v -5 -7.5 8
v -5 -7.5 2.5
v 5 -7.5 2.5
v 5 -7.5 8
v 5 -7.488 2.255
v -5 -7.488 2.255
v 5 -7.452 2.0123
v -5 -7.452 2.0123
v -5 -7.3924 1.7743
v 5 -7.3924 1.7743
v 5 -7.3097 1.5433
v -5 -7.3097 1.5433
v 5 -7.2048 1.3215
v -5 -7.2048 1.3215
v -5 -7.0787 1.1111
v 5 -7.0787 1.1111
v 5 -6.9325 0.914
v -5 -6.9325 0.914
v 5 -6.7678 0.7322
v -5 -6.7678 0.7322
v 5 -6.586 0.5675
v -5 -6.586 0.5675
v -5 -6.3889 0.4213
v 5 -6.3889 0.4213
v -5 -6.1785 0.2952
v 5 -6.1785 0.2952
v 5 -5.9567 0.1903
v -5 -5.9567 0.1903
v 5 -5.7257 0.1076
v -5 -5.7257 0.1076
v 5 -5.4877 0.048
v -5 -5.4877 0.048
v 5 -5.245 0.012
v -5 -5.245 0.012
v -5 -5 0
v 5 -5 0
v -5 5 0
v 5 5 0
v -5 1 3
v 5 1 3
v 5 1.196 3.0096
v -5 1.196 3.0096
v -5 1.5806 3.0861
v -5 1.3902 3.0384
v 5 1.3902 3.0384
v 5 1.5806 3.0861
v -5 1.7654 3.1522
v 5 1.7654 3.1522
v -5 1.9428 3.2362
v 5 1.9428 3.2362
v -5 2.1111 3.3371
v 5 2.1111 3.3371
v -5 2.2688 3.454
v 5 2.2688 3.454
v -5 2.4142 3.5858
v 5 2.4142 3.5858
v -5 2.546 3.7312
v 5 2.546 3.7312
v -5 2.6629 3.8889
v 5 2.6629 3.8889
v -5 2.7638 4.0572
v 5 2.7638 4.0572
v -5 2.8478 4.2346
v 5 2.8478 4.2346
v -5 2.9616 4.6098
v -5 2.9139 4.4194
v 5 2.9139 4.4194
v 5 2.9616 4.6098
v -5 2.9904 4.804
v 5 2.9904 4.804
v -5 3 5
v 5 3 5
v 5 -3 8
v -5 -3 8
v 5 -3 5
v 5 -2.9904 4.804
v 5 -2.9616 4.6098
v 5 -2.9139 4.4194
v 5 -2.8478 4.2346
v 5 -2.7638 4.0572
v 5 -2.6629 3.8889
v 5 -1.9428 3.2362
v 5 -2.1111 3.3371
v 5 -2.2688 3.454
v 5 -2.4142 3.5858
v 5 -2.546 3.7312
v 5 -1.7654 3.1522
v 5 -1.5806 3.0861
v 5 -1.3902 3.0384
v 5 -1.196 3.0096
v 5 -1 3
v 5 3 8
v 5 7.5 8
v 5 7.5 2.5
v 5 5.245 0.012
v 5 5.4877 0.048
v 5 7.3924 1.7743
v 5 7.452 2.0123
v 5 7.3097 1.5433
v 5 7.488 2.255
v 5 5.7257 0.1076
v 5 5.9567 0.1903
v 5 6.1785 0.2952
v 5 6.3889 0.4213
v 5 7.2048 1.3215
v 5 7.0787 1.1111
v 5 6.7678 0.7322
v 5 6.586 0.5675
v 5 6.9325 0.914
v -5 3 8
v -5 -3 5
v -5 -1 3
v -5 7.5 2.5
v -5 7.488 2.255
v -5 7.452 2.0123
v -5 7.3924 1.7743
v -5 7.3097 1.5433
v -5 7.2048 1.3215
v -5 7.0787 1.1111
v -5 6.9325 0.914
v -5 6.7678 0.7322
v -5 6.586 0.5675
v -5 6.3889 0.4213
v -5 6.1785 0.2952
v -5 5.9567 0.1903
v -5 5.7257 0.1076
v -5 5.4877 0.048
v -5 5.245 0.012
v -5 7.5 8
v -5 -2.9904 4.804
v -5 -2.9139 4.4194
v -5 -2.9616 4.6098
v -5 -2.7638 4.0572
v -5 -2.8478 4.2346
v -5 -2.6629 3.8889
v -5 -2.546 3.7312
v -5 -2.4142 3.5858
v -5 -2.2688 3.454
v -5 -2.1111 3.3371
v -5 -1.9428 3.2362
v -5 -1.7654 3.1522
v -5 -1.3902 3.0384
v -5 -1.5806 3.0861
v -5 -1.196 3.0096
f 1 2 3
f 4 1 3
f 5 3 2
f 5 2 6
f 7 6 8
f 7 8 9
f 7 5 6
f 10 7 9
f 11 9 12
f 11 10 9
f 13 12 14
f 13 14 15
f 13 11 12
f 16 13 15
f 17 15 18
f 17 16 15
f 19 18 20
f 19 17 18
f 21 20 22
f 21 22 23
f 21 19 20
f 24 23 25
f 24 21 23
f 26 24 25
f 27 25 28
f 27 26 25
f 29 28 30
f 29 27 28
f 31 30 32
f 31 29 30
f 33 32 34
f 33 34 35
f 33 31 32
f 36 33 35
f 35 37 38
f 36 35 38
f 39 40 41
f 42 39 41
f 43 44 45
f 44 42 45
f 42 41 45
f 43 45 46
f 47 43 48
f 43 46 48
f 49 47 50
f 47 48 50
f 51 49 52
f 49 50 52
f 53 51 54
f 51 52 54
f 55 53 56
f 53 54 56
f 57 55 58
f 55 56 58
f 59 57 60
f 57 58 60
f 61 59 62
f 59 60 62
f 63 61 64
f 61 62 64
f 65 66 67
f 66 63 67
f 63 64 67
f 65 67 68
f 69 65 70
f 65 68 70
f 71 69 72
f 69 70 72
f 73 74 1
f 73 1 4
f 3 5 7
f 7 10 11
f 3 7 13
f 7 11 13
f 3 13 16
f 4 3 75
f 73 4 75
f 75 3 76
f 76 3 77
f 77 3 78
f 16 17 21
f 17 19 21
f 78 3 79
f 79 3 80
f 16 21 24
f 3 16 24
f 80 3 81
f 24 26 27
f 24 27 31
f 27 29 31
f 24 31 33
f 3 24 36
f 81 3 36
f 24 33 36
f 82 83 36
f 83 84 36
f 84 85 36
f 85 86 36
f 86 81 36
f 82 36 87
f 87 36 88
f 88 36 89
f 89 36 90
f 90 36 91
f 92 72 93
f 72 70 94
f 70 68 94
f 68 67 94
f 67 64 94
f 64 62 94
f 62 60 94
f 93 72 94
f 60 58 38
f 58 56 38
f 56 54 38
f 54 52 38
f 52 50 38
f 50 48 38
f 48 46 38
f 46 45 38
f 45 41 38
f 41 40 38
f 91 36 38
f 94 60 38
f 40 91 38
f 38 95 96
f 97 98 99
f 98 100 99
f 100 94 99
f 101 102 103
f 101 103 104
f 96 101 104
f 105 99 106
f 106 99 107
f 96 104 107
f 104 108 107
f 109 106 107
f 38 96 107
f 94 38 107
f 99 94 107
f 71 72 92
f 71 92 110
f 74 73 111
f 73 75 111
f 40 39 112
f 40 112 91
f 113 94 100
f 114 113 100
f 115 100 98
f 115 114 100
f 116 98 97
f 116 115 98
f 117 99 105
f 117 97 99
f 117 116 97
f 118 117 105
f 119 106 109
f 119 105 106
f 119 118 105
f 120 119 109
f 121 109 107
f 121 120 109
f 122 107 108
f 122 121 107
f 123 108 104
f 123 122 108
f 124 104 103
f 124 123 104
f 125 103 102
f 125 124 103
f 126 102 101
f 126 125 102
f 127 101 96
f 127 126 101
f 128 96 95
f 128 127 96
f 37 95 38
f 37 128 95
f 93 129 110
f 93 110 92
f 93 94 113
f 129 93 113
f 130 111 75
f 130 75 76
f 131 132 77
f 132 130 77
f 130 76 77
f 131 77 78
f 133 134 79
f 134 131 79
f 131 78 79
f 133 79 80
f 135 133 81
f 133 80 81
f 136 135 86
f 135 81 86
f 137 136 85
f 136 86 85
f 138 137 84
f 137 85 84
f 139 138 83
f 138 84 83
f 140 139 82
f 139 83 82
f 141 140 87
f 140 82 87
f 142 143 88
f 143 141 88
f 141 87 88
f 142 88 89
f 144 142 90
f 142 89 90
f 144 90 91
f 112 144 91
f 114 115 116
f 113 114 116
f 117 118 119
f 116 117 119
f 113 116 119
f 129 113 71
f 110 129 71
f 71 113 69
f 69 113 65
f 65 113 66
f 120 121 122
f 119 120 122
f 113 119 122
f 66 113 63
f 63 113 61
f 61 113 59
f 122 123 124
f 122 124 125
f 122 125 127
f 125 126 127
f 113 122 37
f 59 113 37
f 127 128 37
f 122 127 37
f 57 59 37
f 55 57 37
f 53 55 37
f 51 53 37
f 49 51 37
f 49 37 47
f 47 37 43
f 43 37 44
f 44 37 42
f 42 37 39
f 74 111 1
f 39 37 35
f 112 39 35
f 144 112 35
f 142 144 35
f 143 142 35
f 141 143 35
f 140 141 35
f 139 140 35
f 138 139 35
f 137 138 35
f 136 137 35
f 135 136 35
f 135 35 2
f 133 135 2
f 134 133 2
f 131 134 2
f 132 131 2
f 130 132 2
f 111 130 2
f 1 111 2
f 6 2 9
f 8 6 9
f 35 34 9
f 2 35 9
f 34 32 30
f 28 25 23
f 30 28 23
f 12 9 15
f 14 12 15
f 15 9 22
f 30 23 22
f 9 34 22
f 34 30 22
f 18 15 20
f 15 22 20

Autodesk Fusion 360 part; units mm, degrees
sketch "Sketch1" plane through (0, 0, 0) normal (0, 0, 1) x (1, 0, 0)
  line L0 (5, 7.5) -> (-5, 7.5)
  line L1 (-5, 7.5) -> (-5, -7.5)
  line L2 (-5, -7.5) -> (5, -7.5)
  line L3 (5, -7.5) -> (5, 7.5)
  line L4 (5, 7.5) -> (-5, -7.5) construction
  line L5 (-5, 7.5) -> (5, -7.5) construction
  line L6 (-5, 7.5) -> (5, 7.5)
  line L7 (5, 7.5) -> (5, 3)
  line L8 (5, 3) -> (-5, 3)
  line L9 (-5, 3) -> (-5, 7.5)
  line L10 (-5, -7.5) -> (5, -7.5)
  line L11 (5, -7.5) -> (5, -3)
  line L12 (5, -3) -> (-5, -3)
  line L13 (-5, -3) -> (-5, -7.5)
  dimension "d1" = 10
  dimension "d2" = 15
  dimension "d3" = 4.5
  dimension "d4" = 4.5
extrude "Extrude1" add sketch "Sketch1" along normal blind 3 makes body 1
extrude "Extrude2" add sketch "Sketch1" along normal blind 8 contours L0 L1 L3 L6 L7 L8 L9 | L1 L2 L3 L10 L11 L12 L13 bodies 1
fillet "Fillet1" radius 2 2 edges at (0, -3, 3) (0, 3, 3) on bodies 1
fillet "Fillet2" radius 2.5 2 edges at (0, -7.5, 0) (0, 7.5, 0) on bodies 1
sketch "Sketch2" plane through (0, 0, 0) normal (0, 0, 1) x (1, 0, 0)
  circle A0 centre (20, 0) radius 4
  circle A1 centre (20, 0) radius 9
  dimension "d13" = 8
  dimension "d14" = 18
extrude "Extrude3" add sketch "Sketch2" along normal blind 20 separate body makes body 2
delete_body "RemoveBody1" bodies 2
